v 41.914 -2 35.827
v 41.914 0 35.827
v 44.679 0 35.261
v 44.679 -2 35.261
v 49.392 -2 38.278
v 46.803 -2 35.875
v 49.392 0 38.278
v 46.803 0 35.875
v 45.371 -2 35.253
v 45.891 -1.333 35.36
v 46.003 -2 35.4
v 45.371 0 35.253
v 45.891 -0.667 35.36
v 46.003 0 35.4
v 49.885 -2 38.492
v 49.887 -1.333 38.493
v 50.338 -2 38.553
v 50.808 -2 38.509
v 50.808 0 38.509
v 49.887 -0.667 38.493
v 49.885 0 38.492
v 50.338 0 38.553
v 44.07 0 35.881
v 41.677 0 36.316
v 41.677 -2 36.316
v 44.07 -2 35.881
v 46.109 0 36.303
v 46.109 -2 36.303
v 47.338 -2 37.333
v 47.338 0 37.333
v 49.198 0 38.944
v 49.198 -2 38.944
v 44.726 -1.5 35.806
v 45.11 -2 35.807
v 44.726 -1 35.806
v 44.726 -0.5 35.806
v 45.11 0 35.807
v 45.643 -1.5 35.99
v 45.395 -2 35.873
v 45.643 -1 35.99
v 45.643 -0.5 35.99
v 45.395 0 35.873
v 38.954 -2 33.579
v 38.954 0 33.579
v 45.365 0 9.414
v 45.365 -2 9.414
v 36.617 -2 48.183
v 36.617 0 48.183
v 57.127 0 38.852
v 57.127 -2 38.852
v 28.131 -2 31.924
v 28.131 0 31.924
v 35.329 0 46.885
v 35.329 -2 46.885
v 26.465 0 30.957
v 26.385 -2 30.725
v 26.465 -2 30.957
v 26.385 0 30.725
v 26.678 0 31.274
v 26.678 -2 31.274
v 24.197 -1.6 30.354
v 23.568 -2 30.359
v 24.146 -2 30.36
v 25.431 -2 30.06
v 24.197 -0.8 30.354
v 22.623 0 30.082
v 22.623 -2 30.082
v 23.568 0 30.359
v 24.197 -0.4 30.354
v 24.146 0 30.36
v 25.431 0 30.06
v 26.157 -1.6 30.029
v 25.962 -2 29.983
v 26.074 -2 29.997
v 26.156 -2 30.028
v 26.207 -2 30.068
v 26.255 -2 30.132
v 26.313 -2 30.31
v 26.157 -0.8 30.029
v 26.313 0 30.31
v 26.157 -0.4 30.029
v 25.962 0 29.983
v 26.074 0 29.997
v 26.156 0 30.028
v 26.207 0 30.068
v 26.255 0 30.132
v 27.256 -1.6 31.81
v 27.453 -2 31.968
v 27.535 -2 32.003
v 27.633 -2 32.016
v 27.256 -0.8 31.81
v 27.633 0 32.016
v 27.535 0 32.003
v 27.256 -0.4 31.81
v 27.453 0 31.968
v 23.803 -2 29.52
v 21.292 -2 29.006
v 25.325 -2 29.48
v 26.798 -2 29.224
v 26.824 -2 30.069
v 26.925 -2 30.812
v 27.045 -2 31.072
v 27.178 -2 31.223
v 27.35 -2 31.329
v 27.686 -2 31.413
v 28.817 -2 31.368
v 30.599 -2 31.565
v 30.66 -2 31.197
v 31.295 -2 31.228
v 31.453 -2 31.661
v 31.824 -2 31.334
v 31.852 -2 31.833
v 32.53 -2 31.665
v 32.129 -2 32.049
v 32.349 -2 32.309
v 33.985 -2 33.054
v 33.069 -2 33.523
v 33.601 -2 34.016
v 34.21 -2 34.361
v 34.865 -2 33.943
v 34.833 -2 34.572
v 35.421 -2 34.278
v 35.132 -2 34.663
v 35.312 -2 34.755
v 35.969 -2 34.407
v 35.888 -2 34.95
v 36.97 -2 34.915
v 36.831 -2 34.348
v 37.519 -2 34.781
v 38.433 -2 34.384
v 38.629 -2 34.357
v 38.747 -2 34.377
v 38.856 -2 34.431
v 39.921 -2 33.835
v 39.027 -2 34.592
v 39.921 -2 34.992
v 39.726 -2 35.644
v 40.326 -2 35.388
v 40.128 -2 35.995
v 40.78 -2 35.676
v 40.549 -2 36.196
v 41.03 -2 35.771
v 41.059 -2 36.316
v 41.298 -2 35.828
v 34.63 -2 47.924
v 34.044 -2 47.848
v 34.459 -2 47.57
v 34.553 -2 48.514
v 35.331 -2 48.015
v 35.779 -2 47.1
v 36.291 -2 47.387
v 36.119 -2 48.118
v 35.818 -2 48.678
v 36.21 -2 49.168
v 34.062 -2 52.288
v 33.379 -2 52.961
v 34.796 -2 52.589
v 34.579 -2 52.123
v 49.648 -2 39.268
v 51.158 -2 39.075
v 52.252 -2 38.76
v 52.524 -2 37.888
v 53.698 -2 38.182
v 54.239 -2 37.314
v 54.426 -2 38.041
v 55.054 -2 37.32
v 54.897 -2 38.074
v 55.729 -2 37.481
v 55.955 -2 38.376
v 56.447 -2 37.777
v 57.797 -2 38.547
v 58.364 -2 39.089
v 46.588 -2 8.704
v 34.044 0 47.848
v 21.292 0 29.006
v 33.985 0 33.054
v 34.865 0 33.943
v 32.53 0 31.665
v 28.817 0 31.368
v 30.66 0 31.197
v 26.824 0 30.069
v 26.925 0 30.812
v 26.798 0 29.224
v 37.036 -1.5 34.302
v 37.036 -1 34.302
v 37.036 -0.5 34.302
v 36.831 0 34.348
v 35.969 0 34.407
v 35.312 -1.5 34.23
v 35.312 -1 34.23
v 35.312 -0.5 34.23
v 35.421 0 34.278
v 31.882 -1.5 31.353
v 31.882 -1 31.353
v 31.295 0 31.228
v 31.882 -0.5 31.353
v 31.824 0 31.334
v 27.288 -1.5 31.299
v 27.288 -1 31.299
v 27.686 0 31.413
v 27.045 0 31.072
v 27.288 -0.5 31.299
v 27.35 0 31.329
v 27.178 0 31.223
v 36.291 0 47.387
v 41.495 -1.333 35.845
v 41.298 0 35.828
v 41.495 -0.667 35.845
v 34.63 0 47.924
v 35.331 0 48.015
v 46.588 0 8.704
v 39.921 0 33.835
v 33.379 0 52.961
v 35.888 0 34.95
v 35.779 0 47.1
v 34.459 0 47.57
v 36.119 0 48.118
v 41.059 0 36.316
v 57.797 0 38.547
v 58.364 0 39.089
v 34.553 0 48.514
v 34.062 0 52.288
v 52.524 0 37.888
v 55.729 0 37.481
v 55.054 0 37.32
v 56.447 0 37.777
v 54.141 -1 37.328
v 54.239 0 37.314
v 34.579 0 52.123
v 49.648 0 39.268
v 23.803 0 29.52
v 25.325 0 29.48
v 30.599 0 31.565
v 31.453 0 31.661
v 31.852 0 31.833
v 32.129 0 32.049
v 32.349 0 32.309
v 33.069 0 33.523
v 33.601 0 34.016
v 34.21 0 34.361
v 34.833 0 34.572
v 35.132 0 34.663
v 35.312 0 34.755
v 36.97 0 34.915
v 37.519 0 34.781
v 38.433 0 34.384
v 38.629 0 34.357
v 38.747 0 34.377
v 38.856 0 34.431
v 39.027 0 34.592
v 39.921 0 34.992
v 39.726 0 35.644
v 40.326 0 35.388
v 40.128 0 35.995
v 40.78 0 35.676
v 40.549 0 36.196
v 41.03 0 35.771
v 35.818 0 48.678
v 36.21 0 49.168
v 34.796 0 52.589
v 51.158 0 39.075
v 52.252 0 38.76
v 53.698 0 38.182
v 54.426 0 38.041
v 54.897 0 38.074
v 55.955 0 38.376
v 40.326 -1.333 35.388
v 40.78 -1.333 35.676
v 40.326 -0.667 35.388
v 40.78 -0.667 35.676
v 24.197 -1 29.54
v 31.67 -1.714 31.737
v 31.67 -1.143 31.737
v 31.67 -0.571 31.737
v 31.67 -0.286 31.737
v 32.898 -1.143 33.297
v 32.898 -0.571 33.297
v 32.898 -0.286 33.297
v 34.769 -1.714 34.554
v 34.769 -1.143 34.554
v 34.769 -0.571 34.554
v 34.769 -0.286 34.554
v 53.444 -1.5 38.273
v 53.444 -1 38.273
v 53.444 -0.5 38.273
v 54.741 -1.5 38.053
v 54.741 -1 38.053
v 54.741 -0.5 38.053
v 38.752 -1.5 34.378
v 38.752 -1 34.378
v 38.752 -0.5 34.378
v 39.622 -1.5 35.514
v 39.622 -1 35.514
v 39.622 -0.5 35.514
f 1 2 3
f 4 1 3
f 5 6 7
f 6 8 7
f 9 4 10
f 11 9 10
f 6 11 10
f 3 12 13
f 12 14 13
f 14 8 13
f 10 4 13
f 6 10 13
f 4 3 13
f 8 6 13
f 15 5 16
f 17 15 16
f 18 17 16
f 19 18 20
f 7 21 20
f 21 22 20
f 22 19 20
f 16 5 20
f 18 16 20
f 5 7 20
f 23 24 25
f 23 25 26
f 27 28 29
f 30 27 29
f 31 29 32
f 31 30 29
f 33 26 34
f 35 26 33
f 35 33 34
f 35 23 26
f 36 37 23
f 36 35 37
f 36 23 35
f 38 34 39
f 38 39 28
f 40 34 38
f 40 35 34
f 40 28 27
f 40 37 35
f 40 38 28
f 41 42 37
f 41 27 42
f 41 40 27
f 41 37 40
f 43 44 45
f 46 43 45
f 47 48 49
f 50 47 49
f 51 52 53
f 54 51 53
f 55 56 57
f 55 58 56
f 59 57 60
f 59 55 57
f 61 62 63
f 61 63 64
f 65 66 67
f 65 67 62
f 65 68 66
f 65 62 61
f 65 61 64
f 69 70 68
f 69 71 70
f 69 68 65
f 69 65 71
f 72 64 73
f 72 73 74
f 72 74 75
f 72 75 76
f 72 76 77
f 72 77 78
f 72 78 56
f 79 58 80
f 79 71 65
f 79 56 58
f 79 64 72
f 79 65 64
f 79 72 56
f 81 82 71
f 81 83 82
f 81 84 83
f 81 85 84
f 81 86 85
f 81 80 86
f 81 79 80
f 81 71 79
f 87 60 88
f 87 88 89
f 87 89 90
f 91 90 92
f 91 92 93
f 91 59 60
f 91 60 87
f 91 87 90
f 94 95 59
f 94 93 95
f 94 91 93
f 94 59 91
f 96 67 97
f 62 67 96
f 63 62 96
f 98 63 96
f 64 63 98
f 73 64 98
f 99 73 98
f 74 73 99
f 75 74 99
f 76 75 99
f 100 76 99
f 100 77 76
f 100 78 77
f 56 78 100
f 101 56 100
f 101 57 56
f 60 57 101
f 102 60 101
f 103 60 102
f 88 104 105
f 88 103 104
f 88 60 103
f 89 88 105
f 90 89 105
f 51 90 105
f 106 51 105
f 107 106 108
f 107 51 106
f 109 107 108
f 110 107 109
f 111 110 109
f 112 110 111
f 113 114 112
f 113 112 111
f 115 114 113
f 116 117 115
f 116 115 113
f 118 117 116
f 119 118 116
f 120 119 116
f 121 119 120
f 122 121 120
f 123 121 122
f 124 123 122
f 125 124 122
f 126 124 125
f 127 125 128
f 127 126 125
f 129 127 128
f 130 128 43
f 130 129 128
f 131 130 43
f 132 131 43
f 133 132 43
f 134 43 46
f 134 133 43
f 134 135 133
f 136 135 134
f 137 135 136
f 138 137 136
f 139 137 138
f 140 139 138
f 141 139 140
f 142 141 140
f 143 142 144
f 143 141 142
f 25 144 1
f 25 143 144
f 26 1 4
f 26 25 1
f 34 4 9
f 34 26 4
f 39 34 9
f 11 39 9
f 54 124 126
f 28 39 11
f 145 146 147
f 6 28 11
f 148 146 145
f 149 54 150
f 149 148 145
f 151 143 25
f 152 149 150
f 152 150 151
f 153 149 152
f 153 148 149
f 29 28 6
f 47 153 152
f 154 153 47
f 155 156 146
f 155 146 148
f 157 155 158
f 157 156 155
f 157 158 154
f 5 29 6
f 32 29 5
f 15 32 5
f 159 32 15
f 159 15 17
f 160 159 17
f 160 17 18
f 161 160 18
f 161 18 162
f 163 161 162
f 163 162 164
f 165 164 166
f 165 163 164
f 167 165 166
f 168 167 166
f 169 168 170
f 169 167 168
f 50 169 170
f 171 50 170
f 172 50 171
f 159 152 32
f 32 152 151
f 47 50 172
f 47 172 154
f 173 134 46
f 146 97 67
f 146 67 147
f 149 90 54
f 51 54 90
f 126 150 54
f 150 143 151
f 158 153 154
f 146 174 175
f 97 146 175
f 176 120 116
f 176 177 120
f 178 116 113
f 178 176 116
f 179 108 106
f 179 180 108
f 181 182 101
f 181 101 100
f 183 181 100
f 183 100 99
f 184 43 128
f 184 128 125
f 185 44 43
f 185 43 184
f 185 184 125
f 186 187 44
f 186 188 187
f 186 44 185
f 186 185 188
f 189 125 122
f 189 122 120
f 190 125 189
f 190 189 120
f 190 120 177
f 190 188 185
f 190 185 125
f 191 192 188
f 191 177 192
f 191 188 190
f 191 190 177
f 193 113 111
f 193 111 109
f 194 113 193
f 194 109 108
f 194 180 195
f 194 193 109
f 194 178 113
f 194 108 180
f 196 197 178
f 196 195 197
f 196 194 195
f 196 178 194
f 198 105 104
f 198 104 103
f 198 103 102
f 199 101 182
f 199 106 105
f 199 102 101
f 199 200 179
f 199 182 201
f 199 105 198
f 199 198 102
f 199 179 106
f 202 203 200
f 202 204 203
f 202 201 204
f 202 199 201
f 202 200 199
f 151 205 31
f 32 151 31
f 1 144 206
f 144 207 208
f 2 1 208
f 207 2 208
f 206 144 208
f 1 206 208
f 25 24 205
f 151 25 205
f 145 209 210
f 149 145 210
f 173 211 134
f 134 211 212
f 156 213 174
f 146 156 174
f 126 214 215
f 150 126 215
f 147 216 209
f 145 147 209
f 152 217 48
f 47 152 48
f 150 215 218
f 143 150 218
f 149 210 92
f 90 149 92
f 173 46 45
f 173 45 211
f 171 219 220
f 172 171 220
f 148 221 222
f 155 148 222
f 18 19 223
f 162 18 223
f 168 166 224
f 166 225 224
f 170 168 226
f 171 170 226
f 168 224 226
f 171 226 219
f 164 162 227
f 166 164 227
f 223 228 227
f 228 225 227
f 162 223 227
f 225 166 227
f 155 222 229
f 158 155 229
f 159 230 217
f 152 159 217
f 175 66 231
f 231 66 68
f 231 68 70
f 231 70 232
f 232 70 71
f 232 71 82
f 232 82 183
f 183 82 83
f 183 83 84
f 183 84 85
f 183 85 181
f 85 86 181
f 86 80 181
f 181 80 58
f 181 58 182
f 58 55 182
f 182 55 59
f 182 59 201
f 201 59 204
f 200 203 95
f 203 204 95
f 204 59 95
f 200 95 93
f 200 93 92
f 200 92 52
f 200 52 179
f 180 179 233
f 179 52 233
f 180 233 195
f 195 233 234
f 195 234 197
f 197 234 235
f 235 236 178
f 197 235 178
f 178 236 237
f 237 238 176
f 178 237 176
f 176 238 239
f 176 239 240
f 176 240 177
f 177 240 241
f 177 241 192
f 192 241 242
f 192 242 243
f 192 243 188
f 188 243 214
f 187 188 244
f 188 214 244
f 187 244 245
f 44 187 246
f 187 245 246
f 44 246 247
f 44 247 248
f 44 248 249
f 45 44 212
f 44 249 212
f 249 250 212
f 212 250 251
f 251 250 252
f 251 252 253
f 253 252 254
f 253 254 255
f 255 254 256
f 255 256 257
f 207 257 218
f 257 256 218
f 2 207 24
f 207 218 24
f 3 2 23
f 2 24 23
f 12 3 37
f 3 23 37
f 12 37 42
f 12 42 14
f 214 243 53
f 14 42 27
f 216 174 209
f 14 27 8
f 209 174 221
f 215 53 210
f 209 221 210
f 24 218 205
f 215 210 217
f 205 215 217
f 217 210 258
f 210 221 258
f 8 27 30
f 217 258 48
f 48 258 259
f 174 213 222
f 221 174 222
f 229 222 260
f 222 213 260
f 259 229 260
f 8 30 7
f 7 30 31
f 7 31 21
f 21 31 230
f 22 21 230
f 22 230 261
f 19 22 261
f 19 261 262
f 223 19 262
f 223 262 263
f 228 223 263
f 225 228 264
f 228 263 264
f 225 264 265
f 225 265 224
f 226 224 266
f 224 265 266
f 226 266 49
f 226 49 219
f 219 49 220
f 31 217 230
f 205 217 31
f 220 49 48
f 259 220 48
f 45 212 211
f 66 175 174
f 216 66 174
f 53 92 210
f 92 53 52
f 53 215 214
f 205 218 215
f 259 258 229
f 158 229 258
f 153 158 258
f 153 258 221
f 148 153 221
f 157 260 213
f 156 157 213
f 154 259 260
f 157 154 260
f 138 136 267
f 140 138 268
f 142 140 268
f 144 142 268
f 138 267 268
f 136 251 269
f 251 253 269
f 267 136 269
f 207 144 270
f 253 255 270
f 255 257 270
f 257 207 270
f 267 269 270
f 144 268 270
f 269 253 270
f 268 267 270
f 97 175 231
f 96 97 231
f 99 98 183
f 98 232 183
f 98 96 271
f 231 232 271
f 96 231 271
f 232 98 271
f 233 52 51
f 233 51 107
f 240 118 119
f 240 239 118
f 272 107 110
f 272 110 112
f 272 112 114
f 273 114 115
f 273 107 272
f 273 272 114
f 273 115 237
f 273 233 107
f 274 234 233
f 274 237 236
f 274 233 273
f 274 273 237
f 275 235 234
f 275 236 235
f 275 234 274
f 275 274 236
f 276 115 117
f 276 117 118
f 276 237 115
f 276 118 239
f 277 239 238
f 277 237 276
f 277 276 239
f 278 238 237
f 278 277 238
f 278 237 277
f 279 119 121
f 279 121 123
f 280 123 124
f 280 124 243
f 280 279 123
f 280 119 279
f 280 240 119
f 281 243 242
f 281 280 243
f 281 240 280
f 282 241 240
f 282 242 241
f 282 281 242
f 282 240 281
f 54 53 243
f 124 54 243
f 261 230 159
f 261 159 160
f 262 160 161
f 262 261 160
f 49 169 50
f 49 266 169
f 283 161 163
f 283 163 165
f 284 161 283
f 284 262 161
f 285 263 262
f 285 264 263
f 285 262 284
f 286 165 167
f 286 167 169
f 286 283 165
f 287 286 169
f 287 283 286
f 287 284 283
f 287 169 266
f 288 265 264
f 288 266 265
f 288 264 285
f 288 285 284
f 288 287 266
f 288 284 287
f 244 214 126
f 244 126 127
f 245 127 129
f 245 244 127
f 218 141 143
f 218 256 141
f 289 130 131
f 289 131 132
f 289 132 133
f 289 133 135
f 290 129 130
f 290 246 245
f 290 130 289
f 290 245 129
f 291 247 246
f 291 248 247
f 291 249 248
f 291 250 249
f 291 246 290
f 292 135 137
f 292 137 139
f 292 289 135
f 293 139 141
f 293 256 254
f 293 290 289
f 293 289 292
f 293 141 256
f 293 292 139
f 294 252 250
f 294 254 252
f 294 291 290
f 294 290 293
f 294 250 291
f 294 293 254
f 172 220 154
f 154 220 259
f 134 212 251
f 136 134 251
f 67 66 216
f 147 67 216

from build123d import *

# Parameters (mm, degrees)
F1_DEPTH    = 2
F2_T1_DEPTH = 27.7168298797


# Not quite as in the source:
# - a fillet or chamfer that OpenCascade refuses, or shapes differently, is made with other operations: its cross-section is extruded or revolved along the edge and cut away or added


with BuildPart() as f1:
    # F0 (on Front) → F1 (new body)
    with BuildSketch(Plane.XZ):
        with BuildLine():
            Line((38.9543399215, 33.578529954), (46.6473846136, 4.5816842054))
            Line((46.6473846136, 4.5816842054), (47.6139461386, 4.8381190285))
            Line((47.6139461386, 4.8381190285), (39.9209014464, 33.834964777))
            Line((39.9209014464, 33.834964777), (39.9209014464, 34.991762988))
            add(Edge.make_bspline(
                [(38.9543399215, 33.578529954), (39.261396009, 34.083414355), (39.5680450127, 34.5875702619), (39.9209014464, 34.991762988)],
                knots=[0, 0, 0, 0, 0.0840395323, 0.0840395323, 0.0840395323, 0.0840395323], degree=3))
        make_face()
        with BuildLine():
            add(Edge.make_bspline(
                [(38.9543399215, 33.578529954), (37.6640439923, 34.1443154), (34.8932435121, 35.3619439278), (32.5863528285, 29.9762581485), (26.5655761049, 32.3528079023), (26.8476535004, 30.0684064483), (26.7979316413, 29.2242113501)],
                knots=[0, 0, 0, 0, 0.2516937882, 0.52851586, 0.8089732942, 1, 1, 1, 1], degree=3))
            add(Edge.make_bspline(
                [(38.9543399215, 33.578529954), (39.261396009, 34.083414355), (39.5680450127, 34.5875702619), (39.9209014464, 34.991762988)],
                knots=[0, 0, 0, 0, 0.0840395323, 0.0840395323, 0.0840395323, 0.0840395323], degree=3))
            add(Edge.make_bspline(
                [(39.9209014464, 34.991762988), (40.305091024, 35.4318474469), (40.7440586925, 35.7534273237), (41.2979722023, 35.8284153044)],
                knots=[0.0840395323, 0.0840395323, 0.0840395323, 0.0840395323, 0.1755416542, 0.1755416542, 0.1755416542, 0.1755416542], degree=3))
            add(Edge.make_bspline(
                [(41.2979722023, 35.8284153044), (41.4906721415, 35.8545027334), (41.6972835341, 35.850746093), (41.914248864, 35.8273036468)],
                knots=[0.1755416542, 0.1755416542, 0.1755416542, 0.1755416542, 0.2073741569, 0.2073741569, 0.2073741569, 0.2073741569], degree=3))
            add(Edge.make_bspline(
                [(41.914248864, 35.8273036468), (43.1236682433, 35.696629549), (46.5485390265, 34.0361170247), (48.7293844979, 38.5978142218), (50.4905452243, 38.5674441057), (50.8079711977, 38.5090563461)],
                knots=[0.2073741569, 0.2073741569, 0.2073741569, 0.2073741569, 0.3848165425, 0.6042792737, 0.6509015915, 0.6509015915, 0.6509015915, 0.6509015915], degree=3))
            Line((50.8079711977, 38.5090563461), (49.6484453004, 39.2675593609))
            Line((49.6484453004, 39.2675593609), (36.1188769209, 48.1179165882))
            Line((36.1188769209, 48.1179165882), (36.6174241261, 48.182718962))
            Line((36.6174241261, 48.182718962), (57.1271326119, 38.8518427461))
            Line((57.1271326119, 38.8518427461), (57.7971301973, 38.5470278562))
            Line((57.7971301973, 38.5470278562), (58.3644174039, 39.0885546803))
            Line((58.3644174039, 39.0885546803), (36.2102526821, 49.1675750053))
            Line((36.2102526821, 49.1675750053), (34.7956053054, 52.5892884836))
            Line((34.7956053054, 52.5892884836), (33.3790388766, 52.9607144486))
            Line((33.3790388766, 52.9607144486), (34.0435805037, 47.848164531))
            Line((34.0435805037, 47.848164531), (21.2916761887, 29.0061510308))
            add(Edge.make_bspline(
                [(21.2916761887, 29.0061510308), (22.2377144422, 29.3003004789), (24.1919394004, 29.7248092747), (25.9431803037, 29.402753862), (26.7979316413, 29.2242113501)],
                knots=[0, 0, 0, 0, 0.5149489736, 1, 1, 1, 1], degree=3))
        make_face()
        with BuildLine():
            Line((35.3305023149, 48.0154417465), (27.6333307537, 32.0162793804))
            add(Edge.make_bspline(
                [(22.623414625, 30.0818228404), (23.0984624572, 30.271051787), (24.0718553407, 30.6285749561), (26.4700247065, 29.5668028622), (26.2229246754, 31.0093421737), (27.2691634193, 31.7917195395), (27.4724411863, 32.0150673015), (27.6333307537, 32.0162793804)],
                knots=[0, 0, 0, 0, 0.2344131875, 0.4959636953, 0.6719941358, 0.8783364267, 1, 1, 1, 1], degree=3))
            Line((22.623414625, 30.0818228404), (34.4592127341, 47.5702122015))
            Line((34.4592127341, 47.5702122015), (34.6295802641, 47.9243341999))
            Line((34.6295802641, 47.9243341999), (35.3305023149, 48.0154417465))
        make_face(mode=Mode.SUBTRACT)
        with BuildLine():
            add(Edge.make_bspline(
                [(28.1314488439, 31.9244866572), (28.7524146036, 31.8044131569), (30.0444740365, 31.5255182244), (31.7027687342, 31.5518548648), (32.4930864971, 32.4035579454), (32.8194445517, 33.3447504689), (33.7630925871, 34.2287315693), (34.7377791878, 34.5605212888), (35.1689763006, 34.6552392698), (35.3122933345, 34.7550361976)],
                knots=[0.0420238635, 0.0420238635, 0.0420238635, 0.0420238635, 0.1988600446, 0.3671317013, 0.4980303245, 0.6259677195, 0.7707900684, 0.901825209, 1, 1, 1, 1], degree=3))
            Line((28.1314488439, 31.9244866572), (35.3289500731, 46.8850458548))
            Line((35.3289500731, 46.8850458548), (35.3122933345, 34.7550361976))
        make_face(mode=Mode.SUBTRACT)
        with BuildLine():
            Line((35.7789325262, 47.0996380734), (41.0592946479, 36.3158529826))
            add(Edge.make_bspline(
                [(35.8884423072, 34.9503078622), (36.4754899607, 34.9773776718), (37.5532358859, 34.9460992821), (38.8819756802, 33.9391375769), (39.5472460755, 35.7321102048), (40.3992507331, 36.2208948371), (41.0592946479, 36.3158529826)],
                knots=[0, 0, 0, 0, 0.2672899311, 0.493356995, 0.7378410778, 1, 1, 1, 1], degree=3))
            Line((35.8884423072, 34.9503078622), (35.7789325262, 47.0996380734))
        make_face(mode=Mode.SUBTRACT)
        Polygon((35.8180012475, 48.678030682), (34.5529859469, 48.5136009278), (34.0623831223, 52.2879791273), (34.5787238251, 52.1228960279), align=None, mode=Mode.SUBTRACT)
        with BuildLine():
            add(Edge.make_bspline(
                [(41.6765891777, 36.3158529826), (42.8641978584, 36.0833171062), (44.6938094993, 35.7263694764), (45.6901446165, 35.8578817285), (47.6400405781, 37.6167605803), (48.6840130278, 38.4955786117), (49.1976533289, 38.9442550866)],
                knots=[0, 0, 0, 0, 0.305073377, 0.4728149529, 0.7460971216, 1, 1, 1, 1], degree=3))
            Line((41.6765891777, 36.3158529826), (36.2907871604, 47.3872721195))
            Line((36.2907871604, 47.3872721195), (49.1976533289, 38.9442550866))
        make_face(mode=Mode.SUBTRACT)
        with BuildLine():
            Line((49.6484453004, 39.2675593609), (50.8079711977, 38.5090563461))
            add(Edge.make_bspline(
                [(50.8079711977, 38.5090563461), (51.8830810784, 38.3112991915), (54.484160752, 36.5282918381), (56.6203789239, 37.8247061914), (57.7971301973, 38.5470278562)],
                knots=[0.6509015915, 0.6509015915, 0.6509015915, 0.6509015915, 0.8088096356, 1, 1, 1, 1], degree=3))
            Line((57.7971301973, 38.5470278562), (57.1271326119, 38.8518427461))
            add(Edge.make_bspline(
                [(49.6484453004, 39.2675593609), (50.3456305804, 39.2010948295), (51.7025455015, 39.0717365126), (53.4260999906, 38.2284905671), (54.784884825, 37.8599443173), (56.2669250792, 38.487560835), (57.1271326119, 38.8518427461)],
                knots=[0, 0, 0, 0, 0.2603727588, 0.5067572303, 0.7137114564, 1, 1, 1, 1], degree=3))
        make_face()
    extrude(amount=F1_DEPTH)

    # F2: chamfer of 5 on 1 edges, made by hand

    # F2_s2 → F2_t1 (cut)
    with BuildSketch(Plane.XZ.offset(-12.8584149398)):
        Polygon((45.3652104983, 9.4144918302), (51.4801922384, 5.8638583208), (46.6473846136, 4.5816842054), align=None)
    extrude(amount=F2_T1_DEPTH, mode=Mode.SUBTRACT)


solid = f1.part
